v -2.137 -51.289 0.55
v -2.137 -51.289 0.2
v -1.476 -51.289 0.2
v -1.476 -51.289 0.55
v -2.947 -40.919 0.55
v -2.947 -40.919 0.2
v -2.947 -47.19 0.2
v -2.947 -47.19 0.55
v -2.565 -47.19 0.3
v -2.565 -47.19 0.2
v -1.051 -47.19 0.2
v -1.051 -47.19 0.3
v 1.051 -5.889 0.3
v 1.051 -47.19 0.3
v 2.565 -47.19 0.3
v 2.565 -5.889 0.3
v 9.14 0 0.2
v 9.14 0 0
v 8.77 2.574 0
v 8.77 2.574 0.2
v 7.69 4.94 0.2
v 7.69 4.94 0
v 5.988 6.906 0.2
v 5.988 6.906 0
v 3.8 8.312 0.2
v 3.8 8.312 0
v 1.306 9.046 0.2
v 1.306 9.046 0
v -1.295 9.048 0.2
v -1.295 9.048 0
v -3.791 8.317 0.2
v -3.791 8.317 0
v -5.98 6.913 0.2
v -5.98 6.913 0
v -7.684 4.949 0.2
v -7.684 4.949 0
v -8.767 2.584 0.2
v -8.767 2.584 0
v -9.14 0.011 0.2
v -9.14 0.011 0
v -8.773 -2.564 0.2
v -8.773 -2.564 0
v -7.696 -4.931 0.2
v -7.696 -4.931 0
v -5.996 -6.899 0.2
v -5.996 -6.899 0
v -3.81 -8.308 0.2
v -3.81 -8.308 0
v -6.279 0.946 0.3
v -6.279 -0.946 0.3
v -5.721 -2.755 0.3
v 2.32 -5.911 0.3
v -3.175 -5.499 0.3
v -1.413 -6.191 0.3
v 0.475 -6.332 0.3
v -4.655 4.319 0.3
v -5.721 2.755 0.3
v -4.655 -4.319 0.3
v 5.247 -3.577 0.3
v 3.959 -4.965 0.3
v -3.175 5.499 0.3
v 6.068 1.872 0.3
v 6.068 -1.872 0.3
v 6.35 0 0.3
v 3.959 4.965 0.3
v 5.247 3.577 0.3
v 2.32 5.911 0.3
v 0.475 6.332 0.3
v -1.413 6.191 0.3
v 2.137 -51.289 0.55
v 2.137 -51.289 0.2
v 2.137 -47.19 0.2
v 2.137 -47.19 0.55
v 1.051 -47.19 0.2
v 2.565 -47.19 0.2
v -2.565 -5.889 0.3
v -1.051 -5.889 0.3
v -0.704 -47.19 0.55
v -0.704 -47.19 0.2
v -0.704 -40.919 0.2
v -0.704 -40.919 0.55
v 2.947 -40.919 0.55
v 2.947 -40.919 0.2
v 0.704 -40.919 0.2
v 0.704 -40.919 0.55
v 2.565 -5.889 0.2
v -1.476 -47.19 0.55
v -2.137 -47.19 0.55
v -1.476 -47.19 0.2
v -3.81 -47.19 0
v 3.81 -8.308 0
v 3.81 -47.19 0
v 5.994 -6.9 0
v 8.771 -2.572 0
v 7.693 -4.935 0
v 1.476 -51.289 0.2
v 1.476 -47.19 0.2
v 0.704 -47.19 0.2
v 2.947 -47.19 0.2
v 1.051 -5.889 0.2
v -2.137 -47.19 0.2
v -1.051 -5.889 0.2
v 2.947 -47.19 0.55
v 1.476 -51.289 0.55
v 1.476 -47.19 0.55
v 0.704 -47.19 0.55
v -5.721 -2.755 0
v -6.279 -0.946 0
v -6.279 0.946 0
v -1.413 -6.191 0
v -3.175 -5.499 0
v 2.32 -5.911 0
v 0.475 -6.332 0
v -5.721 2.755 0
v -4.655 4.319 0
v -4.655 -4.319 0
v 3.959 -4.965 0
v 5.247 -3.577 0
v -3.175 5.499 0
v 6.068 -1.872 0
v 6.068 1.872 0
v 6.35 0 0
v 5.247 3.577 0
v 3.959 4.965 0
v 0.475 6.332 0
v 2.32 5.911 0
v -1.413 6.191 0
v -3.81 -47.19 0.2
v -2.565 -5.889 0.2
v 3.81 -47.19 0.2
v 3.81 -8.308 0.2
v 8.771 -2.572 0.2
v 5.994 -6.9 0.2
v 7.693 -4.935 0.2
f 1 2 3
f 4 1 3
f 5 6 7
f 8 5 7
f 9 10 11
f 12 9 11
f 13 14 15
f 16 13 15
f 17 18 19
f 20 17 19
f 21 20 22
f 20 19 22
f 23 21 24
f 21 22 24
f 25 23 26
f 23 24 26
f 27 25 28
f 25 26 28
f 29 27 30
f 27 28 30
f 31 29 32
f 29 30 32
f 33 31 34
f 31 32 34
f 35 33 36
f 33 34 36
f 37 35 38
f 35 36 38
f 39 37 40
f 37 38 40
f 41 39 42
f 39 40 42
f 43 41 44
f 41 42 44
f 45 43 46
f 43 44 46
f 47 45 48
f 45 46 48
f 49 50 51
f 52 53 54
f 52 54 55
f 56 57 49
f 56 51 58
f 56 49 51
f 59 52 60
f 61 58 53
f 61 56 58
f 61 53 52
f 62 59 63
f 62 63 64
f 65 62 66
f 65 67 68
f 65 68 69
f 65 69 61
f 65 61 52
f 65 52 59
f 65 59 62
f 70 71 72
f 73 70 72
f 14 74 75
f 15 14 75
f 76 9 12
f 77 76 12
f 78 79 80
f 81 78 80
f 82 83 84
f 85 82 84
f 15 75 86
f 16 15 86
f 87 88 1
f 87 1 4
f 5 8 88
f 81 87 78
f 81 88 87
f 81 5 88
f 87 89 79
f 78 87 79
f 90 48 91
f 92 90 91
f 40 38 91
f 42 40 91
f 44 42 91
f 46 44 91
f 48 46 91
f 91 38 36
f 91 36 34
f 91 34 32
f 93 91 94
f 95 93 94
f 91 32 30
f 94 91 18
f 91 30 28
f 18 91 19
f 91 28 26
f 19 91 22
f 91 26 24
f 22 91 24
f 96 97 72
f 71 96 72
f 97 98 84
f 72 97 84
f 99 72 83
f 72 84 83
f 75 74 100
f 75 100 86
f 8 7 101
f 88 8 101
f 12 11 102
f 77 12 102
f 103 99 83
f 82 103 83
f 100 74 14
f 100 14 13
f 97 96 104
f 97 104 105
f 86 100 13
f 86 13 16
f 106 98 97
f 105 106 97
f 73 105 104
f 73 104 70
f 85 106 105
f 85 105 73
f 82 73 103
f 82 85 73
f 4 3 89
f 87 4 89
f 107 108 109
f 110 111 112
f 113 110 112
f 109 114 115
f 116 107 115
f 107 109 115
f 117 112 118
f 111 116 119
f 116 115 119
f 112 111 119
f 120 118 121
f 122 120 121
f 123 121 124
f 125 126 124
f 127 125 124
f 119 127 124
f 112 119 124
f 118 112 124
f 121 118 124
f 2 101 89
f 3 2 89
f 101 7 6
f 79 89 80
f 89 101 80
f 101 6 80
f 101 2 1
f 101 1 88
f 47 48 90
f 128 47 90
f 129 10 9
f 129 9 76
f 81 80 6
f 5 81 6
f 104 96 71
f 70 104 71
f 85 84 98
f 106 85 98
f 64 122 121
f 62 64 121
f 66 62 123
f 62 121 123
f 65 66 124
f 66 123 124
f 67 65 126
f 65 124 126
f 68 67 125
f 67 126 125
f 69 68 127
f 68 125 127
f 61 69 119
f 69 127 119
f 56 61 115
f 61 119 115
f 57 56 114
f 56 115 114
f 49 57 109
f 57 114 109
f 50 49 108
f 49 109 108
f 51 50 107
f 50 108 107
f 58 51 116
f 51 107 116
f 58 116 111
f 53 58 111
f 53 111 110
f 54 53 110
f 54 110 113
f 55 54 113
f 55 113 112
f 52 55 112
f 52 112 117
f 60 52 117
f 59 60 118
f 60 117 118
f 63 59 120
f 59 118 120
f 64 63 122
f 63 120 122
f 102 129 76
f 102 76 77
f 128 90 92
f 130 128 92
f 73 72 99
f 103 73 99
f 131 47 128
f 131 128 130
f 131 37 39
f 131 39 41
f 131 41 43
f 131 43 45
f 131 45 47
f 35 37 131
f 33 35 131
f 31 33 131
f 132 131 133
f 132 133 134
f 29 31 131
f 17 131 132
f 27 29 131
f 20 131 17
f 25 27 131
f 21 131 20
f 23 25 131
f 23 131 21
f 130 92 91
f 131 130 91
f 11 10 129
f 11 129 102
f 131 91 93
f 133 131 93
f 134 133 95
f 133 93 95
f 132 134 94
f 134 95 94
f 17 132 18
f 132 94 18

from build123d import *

# Parameters (mm, degrees)
F0_R     = 6.35
F1_DEPTH = 0.2
F2_DEPTH = 0.3
F3_W     = 1.513528
F3_H     = 41.301278
F4_DEPTH = 0.1
F5_W     = 0.660953
F5_H     = 4.098776
F6_DEPTH = 0.35


with BuildPart() as f1:
    # F0 (on Top) → F1 (new body)
    with BuildSketch(Plane.XY):
        with BuildLine():
            ThreePointArc((3.81, -8.308038), (0, -9.14), (-3.81, -8.308038))
            Line((-3.81, -8.308038), (-3.81, -47.19))
            Line((-3.81, -47.19), (3.81, -47.19))
            Line((3.81, -47.19), (3.81, -8.308038))
        make_face()
        with BuildLine():
            ThreePointArc((3.81, -8.308038), (7.692951, -4.935393), (9.14, 0))
            ThreePointArc((9.14, 0), (-4.935393, 7.692951), (-3.81, -8.308038))
            ThreePointArc((-3.81, -8.308038), (0, -9.14), (3.81, -8.308038))
        make_face()
        Circle(F0_R, mode=Mode.SUBTRACT)
        Circle(F0_R)
    extrude(amount=F1_DEPTH)


with BuildPart() as f2:
    # F0 (on Top) → F2 (new body)
    with BuildSketch(Plane.XY):
        Circle(F0_R)
    extrude(amount=F2_DEPTH)


with BuildPart() as f4:
    # F3 (on face) → F4 (new body)
    with BuildSketch(Plane.XY.offset(0.2)):
        with Locations((-1.808152, -26.539361)):
            Rectangle(F3_W, F3_H)
        with Locations((1.808152, -26.539361)):
            Rectangle(F3_W, F3_H)
    extrude(amount=F4_DEPTH)


with BuildPart() as f6:
    # F5 (on face) → F6 (new body)
    with BuildSketch(Plane.XY.offset(0.2)):
        with Locations((-1.806076, -49.239388)):
            Rectangle(F5_W, F5_H)
        Polygon((0.703611, -40.918831), (0.703611, -47.19), (1.4756, -47.19), (2.136553, -47.19), (2.946904, -47.19), (2.946904, -40.918831), align=None)
        Polygon((-2.946904, -40.918831), (-2.946904, -47.19), (-2.136553, -47.19), (-1.4756, -47.19), (-0.703611, -47.19), (-0.703611, -40.918831), align=None)
        with Locations((1.806076, -49.239388)):
            Rectangle(F5_W, F5_H)
    extrude(amount=F6_DEPTH)


solid = Compound([f1.part, f2.part, f4.part, f6.part])
